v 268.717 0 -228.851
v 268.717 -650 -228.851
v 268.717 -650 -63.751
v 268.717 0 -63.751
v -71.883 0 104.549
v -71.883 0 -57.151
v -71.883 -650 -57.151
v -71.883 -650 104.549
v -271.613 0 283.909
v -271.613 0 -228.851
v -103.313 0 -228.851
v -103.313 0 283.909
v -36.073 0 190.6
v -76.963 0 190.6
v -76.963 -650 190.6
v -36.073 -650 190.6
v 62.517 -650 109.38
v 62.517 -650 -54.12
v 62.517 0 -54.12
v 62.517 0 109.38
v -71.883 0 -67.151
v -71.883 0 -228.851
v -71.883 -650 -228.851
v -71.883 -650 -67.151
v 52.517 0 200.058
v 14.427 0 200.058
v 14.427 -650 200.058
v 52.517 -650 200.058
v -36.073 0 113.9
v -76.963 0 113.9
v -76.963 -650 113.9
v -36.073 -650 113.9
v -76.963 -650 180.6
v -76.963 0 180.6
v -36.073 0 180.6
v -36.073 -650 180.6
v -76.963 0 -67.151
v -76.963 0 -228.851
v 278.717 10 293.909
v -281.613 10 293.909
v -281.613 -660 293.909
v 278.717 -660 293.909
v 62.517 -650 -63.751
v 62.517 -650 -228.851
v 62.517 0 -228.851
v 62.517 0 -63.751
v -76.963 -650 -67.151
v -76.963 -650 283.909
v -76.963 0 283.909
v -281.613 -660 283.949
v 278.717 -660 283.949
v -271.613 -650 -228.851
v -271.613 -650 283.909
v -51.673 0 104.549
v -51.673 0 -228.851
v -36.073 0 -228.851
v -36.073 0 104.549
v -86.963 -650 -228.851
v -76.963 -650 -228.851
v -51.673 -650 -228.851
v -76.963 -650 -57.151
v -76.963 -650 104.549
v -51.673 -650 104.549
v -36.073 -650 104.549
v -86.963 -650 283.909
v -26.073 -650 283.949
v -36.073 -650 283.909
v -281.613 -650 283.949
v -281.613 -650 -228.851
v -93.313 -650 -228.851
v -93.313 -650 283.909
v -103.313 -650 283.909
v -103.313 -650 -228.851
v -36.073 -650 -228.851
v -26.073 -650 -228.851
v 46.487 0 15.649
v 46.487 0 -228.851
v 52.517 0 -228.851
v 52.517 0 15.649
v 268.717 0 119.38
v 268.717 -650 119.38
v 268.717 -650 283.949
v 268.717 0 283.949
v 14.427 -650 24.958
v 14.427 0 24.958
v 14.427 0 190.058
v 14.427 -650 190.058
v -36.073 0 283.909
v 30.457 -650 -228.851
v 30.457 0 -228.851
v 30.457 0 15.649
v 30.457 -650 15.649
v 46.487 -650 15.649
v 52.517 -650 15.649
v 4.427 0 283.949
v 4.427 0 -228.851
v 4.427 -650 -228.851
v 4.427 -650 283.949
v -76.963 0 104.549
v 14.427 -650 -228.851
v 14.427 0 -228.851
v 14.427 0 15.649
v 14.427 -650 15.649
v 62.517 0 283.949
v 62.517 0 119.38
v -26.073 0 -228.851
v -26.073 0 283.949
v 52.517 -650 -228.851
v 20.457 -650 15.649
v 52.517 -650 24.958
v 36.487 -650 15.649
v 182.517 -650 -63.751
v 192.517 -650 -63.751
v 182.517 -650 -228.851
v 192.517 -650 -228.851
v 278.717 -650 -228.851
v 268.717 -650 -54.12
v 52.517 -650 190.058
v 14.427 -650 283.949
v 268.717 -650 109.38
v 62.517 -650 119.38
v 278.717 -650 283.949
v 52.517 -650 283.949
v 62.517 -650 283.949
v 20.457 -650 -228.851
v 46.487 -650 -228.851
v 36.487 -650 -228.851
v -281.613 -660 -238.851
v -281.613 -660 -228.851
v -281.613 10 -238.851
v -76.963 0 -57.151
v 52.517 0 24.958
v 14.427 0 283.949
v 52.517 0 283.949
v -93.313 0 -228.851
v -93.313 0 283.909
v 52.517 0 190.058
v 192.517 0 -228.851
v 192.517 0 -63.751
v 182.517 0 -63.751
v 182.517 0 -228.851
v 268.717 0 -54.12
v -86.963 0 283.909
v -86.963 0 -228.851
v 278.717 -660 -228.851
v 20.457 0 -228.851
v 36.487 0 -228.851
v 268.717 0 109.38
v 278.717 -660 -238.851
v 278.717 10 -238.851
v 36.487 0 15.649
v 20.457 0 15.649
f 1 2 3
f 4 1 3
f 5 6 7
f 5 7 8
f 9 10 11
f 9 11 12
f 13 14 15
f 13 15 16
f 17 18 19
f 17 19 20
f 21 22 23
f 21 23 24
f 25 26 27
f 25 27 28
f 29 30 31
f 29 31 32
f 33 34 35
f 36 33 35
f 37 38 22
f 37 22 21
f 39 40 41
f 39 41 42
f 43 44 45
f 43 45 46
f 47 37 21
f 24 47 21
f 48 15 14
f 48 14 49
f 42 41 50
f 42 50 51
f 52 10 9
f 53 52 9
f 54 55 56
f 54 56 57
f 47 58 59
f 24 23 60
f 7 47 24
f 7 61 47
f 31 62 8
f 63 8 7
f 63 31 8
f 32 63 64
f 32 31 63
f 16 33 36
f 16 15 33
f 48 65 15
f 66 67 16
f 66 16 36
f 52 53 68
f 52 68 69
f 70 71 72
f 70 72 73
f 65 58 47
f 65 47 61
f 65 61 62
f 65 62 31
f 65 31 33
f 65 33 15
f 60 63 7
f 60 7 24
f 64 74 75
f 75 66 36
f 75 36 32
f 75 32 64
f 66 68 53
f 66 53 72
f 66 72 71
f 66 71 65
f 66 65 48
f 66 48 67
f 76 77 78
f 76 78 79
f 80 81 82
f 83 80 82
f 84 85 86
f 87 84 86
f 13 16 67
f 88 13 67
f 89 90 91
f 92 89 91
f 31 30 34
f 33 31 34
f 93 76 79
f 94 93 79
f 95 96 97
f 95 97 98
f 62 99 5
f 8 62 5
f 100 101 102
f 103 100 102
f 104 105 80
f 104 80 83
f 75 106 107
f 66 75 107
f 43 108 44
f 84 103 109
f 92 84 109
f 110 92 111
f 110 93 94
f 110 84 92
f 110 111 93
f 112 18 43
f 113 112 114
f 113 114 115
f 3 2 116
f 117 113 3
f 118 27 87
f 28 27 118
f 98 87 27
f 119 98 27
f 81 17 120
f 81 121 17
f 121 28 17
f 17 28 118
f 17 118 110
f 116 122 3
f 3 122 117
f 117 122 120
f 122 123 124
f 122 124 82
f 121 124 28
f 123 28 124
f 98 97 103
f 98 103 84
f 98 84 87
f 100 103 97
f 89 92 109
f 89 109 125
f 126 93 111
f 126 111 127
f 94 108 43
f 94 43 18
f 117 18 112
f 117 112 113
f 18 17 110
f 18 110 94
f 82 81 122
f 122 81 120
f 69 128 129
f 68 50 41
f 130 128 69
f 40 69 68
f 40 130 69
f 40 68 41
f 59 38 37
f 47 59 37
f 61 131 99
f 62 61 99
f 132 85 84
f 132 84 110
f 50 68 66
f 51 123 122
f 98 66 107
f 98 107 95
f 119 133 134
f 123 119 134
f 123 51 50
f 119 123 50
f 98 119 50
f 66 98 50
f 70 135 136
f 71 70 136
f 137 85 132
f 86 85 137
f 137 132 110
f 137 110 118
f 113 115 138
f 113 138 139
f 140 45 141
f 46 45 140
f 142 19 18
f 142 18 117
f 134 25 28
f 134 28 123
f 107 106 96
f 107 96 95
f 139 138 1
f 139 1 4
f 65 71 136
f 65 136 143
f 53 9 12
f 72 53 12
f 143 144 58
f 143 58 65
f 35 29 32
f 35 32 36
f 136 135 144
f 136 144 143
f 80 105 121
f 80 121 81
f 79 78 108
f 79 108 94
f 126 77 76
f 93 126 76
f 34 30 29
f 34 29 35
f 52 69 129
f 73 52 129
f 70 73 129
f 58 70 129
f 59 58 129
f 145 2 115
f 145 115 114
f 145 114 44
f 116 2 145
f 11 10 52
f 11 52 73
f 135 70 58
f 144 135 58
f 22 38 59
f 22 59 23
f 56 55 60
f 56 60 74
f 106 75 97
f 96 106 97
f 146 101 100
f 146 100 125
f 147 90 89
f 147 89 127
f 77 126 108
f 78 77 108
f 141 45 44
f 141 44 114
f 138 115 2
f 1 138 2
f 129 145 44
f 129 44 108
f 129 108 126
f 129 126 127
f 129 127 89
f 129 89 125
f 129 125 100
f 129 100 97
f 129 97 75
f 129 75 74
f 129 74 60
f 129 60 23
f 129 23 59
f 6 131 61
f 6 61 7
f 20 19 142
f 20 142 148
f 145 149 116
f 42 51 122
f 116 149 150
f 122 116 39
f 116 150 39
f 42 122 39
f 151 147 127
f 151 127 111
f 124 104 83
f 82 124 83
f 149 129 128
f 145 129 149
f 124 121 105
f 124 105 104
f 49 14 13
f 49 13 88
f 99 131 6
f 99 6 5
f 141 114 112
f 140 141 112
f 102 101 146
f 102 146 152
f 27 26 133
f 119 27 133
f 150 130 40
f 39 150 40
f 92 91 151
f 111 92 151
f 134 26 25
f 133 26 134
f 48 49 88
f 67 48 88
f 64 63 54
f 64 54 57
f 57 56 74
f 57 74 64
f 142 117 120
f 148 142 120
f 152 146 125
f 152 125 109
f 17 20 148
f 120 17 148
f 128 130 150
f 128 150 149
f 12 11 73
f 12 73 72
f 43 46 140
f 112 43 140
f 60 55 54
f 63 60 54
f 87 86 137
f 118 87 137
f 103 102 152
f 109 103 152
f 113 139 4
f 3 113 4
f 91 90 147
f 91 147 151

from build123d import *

# Parameters (mm, degrees)
F0_W     = 560.33
F0_H     = 532.76
F0_W_2   = 5.08
F0_H_2   = 161.7
F0_W_3   = 15.6
F0_H_3   = 333.4
F0_W_4   = 6.03
F0_H_4   = 244.5
F0_W_5   = 120
F0_H_5   = 165.1
F0_W_6   = 76.2
F0_W_7   = 168.3
F0_H_6   = 512.76
F0_W_8   = 6.35
F0_W_9   = 30.5
F0_H_7   = 512.8
F0_W_10  = 40.89
F0_H_8   = 66.7
F0_H_9   = 93.309008
F0_W_11  = 38.09
F0_W_12  = 206.2
F0_H_10  = 163.5
F0_H_11  = 83.89079
F0_H_12  = 164.569237
F1_DEPTH = 650
F2_W     = 10
F2_H     = 532.76
F3_DEPTH = 560.33
F4_W     = 560.33
F4_H     = 9.96
F4_H_2   = 10
F5_DEPTH = 10


with BuildPart() as f1:
    # F0 (on Front) → F1 (new body)
    with BuildSketch(Plane.XZ):
        with Locations((-1.447709, 27.52879)):
            Rectangle(F0_W, F0_H)
        with Locations((-74.422709, -148.00121)):
            Rectangle(F0_W_2, F0_H_2, mode=Mode.SUBTRACT)
        with Locations((-43.872709, -62.15121)):
            Rectangle(F0_W_3, F0_H_3, mode=Mode.SUBTRACT)
        with Locations((-74.422709, 23.69879)):
            Rectangle(F0_W_2, F0_H_2, mode=Mode.SUBTRACT)
        with Locations((17.442291, -106.60121)):
            Rectangle(F0_W_4, F0_H_4, mode=Mode.SUBTRACT)
        with Locations((33.472291, -106.60121)):
            Rectangle(F0_W_4, F0_H_4, mode=Mode.SUBTRACT)
        with Locations((49.502291, -106.60121)):
            Rectangle(F0_W_4, F0_H_4, mode=Mode.SUBTRACT)
        with Locations((122.517291, -146.30121)):
            Rectangle(F0_W_5, F0_H_5, mode=Mode.SUBTRACT)
        with Locations((230.617291, -146.30121)):
            Rectangle(F0_W_6, F0_H_5, mode=Mode.SUBTRACT)
        with Locations((-187.462709, 27.52879)):
            Rectangle(F0_W_7, F0_H_6, mode=Mode.SUBTRACT)
        with Locations((-90.137709, 27.52879)):
            Rectangle(F0_W_8, F0_H_6, mode=Mode.SUBTRACT)
        with Locations((-10.822709, 27.54879)):
            Rectangle(F0_W_9, F0_H_7, mode=Mode.SUBTRACT)
        with Locations((-56.517709, 147.249782)):
            Rectangle(F0_W_10, F0_H_8, mode=Mode.SUBTRACT)
        with Locations((-56.517709, 237.254286)):
            Rectangle(F0_W_10, F0_H_9, mode=Mode.SUBTRACT)
        with Locations((33.472291, 107.508)):
            Rectangle(F0_W_11, F0_H_5, mode=Mode.SUBTRACT)
        with Locations((165.617291, 27.629553)):
            Rectangle(F0_W_12, F0_H_10, mode=Mode.SUBTRACT)
        with Locations((33.472291, 242.003395)):
            Rectangle(F0_W_11, F0_H_11, mode=Mode.SUBTRACT)
        with Locations((165.617291, 201.664171)):
            Rectangle(F0_W_12, F0_H_12, mode=Mode.SUBTRACT)
    extrude(amount=F1_DEPTH)

    # F2 (on face) → F3 (join, through all)
    with BuildSketch(Plane(origin=(-281.612709, 0, 0), x_dir=(0, -1, 0), z_dir=(-1, 0, 0))):
        with Locations((-5, 27.52879)):
            Rectangle(F2_W, F2_H)
    extrude(amount=-F3_DEPTH)

    # F4 (on face) → F5 (join)
    with BuildSketch(Plane.XZ.offset(650)):
        with Locations((-1.447709, 288.92879)):
            Rectangle(F4_W, F4_H)
        with Locations((-1.447709, -233.85121)):
            Rectangle(F4_W, F4_H_2)
    extrude(amount=F5_DEPTH)


solid = f1.part
